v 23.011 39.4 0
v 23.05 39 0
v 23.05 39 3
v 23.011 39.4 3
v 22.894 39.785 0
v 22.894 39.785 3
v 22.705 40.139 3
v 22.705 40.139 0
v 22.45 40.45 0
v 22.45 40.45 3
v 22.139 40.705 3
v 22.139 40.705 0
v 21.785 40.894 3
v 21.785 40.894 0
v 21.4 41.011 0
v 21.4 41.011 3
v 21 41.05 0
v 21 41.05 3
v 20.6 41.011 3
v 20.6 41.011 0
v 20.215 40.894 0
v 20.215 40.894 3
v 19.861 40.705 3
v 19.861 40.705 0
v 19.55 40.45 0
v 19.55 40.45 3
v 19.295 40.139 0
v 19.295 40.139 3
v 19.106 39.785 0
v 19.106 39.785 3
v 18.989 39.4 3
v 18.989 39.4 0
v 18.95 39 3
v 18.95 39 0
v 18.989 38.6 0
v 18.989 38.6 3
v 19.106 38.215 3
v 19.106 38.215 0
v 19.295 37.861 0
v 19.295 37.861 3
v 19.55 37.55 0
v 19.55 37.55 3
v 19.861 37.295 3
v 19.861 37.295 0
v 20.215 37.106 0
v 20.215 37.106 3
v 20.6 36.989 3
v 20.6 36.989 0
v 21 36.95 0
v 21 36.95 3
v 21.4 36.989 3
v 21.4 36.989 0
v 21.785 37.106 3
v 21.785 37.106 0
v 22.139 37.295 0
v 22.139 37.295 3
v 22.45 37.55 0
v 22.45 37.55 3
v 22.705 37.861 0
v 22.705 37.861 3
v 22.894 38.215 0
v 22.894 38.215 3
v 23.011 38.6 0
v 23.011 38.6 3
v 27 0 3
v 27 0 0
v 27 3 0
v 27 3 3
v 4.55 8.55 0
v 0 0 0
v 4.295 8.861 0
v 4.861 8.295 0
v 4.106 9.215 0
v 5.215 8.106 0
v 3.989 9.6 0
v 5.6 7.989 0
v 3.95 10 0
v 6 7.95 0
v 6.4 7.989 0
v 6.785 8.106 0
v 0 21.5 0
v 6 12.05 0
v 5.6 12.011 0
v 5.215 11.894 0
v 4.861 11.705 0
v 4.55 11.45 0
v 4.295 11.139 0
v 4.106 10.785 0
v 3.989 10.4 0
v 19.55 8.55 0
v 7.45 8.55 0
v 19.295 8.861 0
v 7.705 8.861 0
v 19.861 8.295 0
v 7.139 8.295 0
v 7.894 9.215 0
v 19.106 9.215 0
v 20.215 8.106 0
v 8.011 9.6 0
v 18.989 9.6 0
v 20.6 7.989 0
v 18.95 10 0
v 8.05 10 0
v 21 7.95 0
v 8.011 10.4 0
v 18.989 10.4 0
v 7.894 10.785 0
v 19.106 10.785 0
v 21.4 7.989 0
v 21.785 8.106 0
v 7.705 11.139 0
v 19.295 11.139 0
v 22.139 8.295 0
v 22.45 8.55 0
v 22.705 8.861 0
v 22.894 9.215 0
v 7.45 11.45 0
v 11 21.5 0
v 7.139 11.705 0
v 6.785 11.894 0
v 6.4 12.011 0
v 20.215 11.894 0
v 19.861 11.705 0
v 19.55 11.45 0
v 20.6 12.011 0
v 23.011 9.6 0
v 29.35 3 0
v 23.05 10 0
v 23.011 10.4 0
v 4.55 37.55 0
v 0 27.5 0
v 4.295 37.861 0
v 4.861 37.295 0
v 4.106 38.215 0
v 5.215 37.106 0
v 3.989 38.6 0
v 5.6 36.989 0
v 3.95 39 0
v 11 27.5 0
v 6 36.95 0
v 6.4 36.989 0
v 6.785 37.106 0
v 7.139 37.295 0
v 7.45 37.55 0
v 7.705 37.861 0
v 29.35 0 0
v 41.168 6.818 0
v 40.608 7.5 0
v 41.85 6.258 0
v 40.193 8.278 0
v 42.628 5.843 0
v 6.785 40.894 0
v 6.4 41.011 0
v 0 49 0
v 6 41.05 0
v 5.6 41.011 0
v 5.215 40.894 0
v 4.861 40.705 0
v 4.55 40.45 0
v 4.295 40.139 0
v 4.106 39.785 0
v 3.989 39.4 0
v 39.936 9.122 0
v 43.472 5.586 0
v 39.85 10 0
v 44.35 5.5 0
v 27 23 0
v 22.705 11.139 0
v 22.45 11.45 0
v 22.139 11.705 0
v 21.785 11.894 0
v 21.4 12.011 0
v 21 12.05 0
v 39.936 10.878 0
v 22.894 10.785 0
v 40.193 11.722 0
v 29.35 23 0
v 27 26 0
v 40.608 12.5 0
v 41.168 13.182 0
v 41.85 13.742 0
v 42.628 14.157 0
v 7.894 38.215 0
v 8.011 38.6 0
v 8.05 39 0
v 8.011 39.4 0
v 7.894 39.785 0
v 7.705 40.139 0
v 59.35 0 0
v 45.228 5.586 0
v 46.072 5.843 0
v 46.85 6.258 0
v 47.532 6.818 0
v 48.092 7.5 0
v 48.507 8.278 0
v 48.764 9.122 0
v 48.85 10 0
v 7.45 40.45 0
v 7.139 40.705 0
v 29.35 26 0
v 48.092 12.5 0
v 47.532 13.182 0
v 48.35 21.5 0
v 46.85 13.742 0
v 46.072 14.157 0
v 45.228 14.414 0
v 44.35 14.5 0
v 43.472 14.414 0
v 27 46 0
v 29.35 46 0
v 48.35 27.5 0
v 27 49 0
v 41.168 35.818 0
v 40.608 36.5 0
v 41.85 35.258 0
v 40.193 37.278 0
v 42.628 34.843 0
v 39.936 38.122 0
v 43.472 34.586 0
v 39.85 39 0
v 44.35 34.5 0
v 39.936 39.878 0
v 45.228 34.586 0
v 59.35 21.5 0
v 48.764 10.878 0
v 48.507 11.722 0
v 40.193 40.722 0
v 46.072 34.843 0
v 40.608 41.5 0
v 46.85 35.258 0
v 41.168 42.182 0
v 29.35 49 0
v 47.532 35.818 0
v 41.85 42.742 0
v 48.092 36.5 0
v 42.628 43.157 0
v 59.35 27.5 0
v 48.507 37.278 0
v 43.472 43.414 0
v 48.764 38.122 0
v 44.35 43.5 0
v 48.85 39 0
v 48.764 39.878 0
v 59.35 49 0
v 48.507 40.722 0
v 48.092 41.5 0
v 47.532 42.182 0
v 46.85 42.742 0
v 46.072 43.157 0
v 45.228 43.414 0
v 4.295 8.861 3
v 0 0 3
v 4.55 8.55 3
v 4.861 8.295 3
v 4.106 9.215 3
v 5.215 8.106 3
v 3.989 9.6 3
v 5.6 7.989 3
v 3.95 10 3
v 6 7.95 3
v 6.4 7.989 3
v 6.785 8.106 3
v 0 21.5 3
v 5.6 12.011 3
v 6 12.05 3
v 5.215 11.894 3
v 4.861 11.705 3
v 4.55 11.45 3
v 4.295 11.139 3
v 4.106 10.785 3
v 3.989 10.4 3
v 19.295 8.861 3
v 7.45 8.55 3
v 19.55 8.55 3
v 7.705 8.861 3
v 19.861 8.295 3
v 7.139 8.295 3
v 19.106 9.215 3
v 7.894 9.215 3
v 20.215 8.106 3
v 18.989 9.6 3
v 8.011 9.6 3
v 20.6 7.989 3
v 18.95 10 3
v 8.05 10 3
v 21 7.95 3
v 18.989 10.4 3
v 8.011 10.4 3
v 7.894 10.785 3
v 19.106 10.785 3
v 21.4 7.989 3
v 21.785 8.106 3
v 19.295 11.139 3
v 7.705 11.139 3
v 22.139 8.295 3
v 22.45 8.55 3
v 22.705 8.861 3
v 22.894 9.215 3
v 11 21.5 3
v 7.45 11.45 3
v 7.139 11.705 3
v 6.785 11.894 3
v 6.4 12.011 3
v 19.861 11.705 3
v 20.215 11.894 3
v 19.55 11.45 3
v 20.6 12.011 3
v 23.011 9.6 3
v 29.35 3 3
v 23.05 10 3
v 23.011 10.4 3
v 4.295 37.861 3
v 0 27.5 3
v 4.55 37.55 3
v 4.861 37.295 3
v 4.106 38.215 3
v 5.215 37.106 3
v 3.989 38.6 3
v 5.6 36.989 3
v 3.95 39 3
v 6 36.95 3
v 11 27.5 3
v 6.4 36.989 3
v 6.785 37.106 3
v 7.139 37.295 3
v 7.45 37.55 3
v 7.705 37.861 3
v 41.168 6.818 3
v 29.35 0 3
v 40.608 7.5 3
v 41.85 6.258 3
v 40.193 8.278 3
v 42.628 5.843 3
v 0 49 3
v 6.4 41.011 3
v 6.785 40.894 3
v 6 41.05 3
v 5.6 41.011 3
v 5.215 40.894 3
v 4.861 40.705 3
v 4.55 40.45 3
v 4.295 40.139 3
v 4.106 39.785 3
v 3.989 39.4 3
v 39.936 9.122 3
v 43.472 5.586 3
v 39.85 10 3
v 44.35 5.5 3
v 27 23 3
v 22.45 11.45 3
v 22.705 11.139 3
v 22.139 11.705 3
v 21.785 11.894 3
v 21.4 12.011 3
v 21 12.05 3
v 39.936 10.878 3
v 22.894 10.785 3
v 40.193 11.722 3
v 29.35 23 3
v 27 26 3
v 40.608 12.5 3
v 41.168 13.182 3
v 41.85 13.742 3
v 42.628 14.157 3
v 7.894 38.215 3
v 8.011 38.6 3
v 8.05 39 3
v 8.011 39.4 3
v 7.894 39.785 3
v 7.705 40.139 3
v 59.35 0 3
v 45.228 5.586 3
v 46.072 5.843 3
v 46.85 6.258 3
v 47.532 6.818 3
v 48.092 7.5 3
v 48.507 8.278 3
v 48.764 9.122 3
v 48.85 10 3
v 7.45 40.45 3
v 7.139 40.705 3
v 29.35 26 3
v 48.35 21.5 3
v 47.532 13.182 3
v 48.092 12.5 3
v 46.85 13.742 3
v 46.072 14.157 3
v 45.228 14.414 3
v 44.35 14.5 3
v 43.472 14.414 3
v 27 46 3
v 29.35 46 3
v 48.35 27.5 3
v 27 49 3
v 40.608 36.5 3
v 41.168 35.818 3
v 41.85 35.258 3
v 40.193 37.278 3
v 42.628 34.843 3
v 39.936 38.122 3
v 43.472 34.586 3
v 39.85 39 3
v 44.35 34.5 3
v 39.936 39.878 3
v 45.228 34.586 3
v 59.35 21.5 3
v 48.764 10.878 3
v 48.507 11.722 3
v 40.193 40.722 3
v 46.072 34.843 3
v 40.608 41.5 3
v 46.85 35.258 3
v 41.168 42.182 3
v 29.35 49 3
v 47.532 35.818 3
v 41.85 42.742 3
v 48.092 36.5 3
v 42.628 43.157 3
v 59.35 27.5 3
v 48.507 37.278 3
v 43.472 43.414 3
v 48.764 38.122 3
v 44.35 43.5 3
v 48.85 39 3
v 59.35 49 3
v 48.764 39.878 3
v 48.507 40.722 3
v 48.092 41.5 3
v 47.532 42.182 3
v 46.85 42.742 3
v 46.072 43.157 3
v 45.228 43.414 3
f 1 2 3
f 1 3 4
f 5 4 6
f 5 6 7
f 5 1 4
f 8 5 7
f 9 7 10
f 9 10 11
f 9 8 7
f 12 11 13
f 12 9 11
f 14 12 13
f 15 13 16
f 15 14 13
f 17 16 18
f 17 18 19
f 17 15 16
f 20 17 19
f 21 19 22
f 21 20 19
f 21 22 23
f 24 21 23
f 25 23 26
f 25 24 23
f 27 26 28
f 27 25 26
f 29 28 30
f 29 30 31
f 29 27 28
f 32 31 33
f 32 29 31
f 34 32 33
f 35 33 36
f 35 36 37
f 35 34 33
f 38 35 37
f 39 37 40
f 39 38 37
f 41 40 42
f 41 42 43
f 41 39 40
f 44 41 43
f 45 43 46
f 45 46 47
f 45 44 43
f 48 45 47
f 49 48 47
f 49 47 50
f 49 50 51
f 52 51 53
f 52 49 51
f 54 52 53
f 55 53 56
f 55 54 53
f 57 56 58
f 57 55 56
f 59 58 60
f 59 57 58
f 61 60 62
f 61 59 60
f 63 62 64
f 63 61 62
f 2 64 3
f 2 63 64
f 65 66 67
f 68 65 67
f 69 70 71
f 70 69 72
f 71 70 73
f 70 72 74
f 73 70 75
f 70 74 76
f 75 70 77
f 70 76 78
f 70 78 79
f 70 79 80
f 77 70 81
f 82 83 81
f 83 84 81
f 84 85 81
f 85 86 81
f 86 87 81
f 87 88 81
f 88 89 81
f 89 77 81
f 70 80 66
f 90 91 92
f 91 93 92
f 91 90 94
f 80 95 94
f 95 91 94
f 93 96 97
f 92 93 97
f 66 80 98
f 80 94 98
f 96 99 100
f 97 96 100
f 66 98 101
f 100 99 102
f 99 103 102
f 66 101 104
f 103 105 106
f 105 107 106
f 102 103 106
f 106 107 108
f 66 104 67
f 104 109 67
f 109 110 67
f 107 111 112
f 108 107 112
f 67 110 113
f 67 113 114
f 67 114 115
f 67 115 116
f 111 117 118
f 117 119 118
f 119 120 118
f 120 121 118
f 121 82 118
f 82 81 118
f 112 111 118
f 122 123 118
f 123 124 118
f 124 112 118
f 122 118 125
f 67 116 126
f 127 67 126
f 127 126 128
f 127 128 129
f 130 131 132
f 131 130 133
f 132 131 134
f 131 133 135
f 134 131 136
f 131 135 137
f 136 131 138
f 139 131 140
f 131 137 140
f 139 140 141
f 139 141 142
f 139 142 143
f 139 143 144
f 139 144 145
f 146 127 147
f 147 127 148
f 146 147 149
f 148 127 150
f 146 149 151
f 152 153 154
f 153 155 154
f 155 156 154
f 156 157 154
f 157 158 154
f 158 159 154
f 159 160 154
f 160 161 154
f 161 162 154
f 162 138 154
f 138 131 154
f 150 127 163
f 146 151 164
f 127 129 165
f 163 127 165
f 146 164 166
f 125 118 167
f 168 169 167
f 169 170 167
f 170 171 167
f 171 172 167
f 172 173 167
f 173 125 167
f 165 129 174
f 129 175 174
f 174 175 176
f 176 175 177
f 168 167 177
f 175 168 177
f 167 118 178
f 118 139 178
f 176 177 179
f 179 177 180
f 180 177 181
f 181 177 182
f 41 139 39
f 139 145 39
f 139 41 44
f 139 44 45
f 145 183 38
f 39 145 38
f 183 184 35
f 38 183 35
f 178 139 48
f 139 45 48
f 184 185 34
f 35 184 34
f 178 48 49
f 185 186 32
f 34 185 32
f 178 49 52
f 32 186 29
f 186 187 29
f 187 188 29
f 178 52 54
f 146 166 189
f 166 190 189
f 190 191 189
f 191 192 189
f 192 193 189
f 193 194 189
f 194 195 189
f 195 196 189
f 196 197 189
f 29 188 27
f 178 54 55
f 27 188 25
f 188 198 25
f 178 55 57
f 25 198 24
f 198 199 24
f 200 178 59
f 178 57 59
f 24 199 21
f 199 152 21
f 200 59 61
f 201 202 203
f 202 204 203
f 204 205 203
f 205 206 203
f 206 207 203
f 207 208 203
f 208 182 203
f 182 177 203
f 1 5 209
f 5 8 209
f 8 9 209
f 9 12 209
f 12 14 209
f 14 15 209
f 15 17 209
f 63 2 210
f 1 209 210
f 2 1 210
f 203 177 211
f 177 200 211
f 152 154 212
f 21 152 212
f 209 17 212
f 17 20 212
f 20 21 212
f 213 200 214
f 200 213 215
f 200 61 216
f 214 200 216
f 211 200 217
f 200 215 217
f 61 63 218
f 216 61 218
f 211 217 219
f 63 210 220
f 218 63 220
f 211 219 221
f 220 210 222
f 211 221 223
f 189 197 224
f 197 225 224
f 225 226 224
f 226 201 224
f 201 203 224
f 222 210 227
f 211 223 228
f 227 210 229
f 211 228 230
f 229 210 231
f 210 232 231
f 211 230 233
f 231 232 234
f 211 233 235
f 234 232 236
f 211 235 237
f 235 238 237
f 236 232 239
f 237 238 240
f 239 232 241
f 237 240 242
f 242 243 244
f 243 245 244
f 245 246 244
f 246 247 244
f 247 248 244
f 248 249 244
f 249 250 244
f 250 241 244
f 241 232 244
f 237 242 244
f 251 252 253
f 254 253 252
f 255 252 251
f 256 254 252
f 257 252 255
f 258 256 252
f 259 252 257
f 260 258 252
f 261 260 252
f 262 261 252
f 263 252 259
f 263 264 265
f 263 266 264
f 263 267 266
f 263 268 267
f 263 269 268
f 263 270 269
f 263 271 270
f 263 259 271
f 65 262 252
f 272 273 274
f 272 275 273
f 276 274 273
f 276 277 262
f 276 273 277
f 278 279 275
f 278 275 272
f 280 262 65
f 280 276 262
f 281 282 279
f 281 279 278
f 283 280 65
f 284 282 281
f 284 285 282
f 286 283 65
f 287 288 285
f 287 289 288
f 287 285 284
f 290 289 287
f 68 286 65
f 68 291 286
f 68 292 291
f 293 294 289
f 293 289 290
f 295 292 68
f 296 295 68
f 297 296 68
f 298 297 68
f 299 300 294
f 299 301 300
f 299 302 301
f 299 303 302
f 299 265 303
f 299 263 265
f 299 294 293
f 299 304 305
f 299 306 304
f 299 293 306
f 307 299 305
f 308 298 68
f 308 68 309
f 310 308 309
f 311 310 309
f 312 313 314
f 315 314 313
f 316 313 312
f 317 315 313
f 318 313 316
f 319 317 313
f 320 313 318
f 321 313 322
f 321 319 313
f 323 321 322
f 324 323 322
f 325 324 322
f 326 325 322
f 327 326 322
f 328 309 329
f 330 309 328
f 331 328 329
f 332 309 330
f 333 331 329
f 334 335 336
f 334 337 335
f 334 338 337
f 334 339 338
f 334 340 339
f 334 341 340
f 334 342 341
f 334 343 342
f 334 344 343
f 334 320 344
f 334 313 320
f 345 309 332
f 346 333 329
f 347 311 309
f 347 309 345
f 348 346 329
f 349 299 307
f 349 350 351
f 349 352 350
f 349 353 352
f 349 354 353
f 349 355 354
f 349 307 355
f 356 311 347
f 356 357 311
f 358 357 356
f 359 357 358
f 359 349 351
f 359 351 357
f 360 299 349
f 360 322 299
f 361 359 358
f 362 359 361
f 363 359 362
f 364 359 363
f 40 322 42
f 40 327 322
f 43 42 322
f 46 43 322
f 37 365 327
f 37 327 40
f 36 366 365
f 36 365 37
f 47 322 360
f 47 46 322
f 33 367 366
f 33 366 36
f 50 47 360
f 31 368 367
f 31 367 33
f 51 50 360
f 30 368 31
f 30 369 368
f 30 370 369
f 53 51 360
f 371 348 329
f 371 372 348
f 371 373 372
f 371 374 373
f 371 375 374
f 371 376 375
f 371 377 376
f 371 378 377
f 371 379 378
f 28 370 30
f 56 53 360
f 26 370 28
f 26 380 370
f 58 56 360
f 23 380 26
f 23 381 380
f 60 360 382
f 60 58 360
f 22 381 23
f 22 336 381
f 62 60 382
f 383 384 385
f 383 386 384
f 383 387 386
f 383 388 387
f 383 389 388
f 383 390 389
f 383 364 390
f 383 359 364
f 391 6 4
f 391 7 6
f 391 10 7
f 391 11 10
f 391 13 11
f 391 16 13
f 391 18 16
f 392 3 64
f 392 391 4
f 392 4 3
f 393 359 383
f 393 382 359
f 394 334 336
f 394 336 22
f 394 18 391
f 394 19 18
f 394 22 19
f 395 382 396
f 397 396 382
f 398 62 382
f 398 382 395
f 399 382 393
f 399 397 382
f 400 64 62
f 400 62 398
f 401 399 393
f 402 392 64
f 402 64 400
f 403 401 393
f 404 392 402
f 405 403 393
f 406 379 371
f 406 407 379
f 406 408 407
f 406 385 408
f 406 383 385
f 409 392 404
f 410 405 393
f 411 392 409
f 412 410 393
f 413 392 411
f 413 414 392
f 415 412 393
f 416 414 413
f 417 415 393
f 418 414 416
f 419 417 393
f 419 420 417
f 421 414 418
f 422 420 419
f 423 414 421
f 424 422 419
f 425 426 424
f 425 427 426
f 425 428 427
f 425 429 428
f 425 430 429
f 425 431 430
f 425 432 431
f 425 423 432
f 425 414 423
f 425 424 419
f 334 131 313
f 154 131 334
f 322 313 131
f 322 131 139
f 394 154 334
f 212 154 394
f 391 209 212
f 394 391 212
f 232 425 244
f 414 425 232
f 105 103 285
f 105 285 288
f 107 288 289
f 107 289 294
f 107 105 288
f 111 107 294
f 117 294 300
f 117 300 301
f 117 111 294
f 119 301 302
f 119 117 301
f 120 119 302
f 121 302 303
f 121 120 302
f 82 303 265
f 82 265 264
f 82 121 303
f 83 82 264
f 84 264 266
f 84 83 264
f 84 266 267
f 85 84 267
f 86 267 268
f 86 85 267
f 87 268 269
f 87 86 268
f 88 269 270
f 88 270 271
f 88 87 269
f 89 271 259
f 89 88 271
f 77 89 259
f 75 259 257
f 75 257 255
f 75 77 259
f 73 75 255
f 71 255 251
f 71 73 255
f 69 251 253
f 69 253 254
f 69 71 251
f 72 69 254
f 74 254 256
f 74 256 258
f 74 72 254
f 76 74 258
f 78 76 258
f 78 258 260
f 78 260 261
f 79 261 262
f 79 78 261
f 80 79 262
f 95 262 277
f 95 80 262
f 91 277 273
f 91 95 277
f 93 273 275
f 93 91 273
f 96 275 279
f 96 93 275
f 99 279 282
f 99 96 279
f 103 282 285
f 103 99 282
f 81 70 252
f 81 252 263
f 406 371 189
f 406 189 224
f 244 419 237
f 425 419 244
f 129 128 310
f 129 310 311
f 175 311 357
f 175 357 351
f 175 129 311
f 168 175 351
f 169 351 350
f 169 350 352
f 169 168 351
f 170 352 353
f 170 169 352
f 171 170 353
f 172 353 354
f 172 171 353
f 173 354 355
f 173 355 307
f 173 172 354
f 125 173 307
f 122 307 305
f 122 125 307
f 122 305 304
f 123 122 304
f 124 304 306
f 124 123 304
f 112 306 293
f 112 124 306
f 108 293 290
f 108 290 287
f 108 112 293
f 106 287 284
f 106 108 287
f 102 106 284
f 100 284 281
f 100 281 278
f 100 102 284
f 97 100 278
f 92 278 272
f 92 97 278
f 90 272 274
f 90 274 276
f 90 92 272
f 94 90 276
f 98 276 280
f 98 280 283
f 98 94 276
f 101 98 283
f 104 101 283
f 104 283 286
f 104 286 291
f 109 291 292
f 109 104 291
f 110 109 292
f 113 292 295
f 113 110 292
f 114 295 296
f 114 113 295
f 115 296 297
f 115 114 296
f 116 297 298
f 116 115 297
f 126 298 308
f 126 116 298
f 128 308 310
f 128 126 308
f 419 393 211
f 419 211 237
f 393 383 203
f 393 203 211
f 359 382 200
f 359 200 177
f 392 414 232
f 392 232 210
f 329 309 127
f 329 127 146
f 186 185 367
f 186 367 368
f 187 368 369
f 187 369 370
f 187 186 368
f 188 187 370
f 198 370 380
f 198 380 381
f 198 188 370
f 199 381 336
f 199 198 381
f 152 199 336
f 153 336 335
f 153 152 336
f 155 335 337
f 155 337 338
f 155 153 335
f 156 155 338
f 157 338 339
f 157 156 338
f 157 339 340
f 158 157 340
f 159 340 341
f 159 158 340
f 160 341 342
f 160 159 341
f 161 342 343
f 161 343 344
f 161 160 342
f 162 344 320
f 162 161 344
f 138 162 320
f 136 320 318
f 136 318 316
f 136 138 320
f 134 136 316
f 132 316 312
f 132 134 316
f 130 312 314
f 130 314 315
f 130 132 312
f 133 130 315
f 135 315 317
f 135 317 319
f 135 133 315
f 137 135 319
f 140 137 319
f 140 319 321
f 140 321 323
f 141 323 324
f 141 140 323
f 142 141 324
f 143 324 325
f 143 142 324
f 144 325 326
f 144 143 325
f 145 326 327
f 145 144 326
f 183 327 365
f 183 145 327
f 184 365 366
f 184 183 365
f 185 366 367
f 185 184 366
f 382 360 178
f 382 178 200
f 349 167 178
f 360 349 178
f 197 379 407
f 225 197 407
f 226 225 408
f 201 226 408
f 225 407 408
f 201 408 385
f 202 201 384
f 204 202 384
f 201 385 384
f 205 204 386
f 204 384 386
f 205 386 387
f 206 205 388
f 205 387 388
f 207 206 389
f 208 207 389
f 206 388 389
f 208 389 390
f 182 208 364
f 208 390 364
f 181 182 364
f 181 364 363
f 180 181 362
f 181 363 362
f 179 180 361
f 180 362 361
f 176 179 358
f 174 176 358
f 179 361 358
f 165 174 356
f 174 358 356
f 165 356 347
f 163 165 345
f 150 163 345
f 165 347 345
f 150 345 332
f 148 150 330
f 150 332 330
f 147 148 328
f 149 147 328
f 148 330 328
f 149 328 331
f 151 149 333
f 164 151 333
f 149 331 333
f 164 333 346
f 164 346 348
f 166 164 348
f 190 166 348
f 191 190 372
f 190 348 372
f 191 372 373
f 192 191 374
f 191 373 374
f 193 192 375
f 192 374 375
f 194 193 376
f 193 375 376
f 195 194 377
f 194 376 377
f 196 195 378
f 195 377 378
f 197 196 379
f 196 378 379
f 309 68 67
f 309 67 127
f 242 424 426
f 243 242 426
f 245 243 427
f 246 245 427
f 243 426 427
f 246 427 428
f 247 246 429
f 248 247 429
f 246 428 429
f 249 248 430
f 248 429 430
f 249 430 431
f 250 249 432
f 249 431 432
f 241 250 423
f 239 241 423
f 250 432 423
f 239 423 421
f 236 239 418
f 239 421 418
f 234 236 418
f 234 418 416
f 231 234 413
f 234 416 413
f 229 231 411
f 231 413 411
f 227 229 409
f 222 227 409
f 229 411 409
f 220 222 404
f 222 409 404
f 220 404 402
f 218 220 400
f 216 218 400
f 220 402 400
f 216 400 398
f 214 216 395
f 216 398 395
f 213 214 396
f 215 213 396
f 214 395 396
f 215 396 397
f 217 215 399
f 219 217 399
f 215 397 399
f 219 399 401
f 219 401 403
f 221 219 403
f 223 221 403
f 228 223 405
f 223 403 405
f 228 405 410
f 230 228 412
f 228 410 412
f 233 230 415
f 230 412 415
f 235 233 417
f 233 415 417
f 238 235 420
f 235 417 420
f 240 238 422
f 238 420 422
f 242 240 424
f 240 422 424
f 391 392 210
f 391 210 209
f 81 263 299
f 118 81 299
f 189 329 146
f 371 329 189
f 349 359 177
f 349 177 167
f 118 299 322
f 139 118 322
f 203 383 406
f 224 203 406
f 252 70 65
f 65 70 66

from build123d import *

# Parameters (mm, degrees)
SKETCH2_W           = 27
SKETCH2_H           = 49
SKETCH2_R           = 2.05
BOSS_EXTRUDE1_DEPTH = 3
SKETCH8_R           = 4.5
BOSS_EXTRUDE3_DEPTH = 3
SKETCH9_W           = 11
SKETCH9_H           = 6
CUT_EXTRUDE4_DEPTH  = 4


with BuildPart() as part:
    # Sketch2 → Boss-Extrude1 (new body)
    with BuildSketch(Plane.XY):
        with Locations((13.5, 24.5)):
            Rectangle(SKETCH2_W, SKETCH2_H)
        with Locations((6, 39)):
            Circle(SKETCH2_R, mode=Mode.SUBTRACT)
        with Locations((21, 39)):
            Circle(SKETCH2_R, mode=Mode.SUBTRACT)
        with Locations((6, 10)):
            Circle(SKETCH2_R, mode=Mode.SUBTRACT)
        with Locations((21, 10)):
            Circle(SKETCH2_R, mode=Mode.SUBTRACT)
    extrude(amount=BOSS_EXTRUDE1_DEPTH)

    # Sketch8 → Boss-Extrude3 (add)
    with BuildSketch(Plane.XY.offset(3)):
        Polygon((29.35, 0), (59.35, 0), (59.35, 49), (29.35, 49), (29.35, 46), (27, 46), (27, 26), (29.35, 26), (29.35, 23), (27, 23), (27, 3), (29.35, 3), align=None)
        with Locations((44.35, 39)):
            Circle(SKETCH8_R, mode=Mode.SUBTRACT)
        with Locations((44.35, 10)):
            Circle(SKETCH8_R, mode=Mode.SUBTRACT)
    extrude(amount=-BOSS_EXTRUDE3_DEPTH)

    # Sketch9 → Cut-Extrude4 (cut, through all)
    with BuildSketch(Plane.XY.offset(3)):
        with Locations((5.5, 24.5)):
            Rectangle(SKETCH9_W, SKETCH9_H)
        with Locations((53.85, 24.5)):
            Rectangle(SKETCH9_W, SKETCH9_H)
    extrude(amount=-CUT_EXTRUDE4_DEPTH, mode=Mode.SUBTRACT)


solid = part.part
